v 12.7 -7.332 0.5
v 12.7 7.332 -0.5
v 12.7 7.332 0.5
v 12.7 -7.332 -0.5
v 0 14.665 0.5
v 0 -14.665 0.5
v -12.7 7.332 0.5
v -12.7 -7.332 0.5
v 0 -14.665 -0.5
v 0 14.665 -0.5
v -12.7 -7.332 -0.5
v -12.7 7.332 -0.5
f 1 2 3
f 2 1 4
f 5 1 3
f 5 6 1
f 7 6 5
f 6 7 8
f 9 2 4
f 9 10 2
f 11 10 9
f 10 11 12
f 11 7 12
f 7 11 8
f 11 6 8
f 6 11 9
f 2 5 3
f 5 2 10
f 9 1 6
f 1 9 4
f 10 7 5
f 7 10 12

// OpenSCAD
//============================================================
// OpenSCAD
// Licence : LICENCE PUBLIQUE RIEN À BRANLER
// Licence : do What The Fuck you want to Public License
//============================================================
/*

	Usage:
	use <hexagon.scad>;
	Pour créer des jeux, des têtes de vis...

*/


//------------------------------------------------------------
// Demo
//------------------------------------------------------------
$fn = 150 ;			// OpenSCAD Resolution
// hexagone de 1 pouce (1 inch) soit 25.4 mm
Hexagone(cle=25.4,h=1);

//------------------------------------------------------------
// Hexagone
// cle	écart, ex: clé de 12 alors cle=12
// h		hauteur
//------------------------------------------------------------
module Hexagone(cle,h)
{
	angle = 360/6;		// 6 pans
	cote = cle * cot(angle);
	echo(angle, cot(angle), cote);
	echo(acos(.6));

	union()
	{
		rotate([0,0,0])
			cube([cle,cote,h],center=true);
		rotate([0,0,angle])
			cube([cle,cote,h],center=true);
		rotate([0,0,2*angle])
			cube([cle,cote,h],center=true);
	}

// Vérification par un cercle de taille cle
//	#cylinder(r=cle/2,h=2*h,center=true);
//	%circle(r=cote,center=true);
//	#cube([cote,cote,1]);
}

//------------------------------------------------------------
// Fonction cotangente
// Permet d'avoir les bones dimensions
// utiliser $fn n'est pas bon
//------------------------------------------------------------
function cot(x)=1/tan(x);

//==EOF=======================================================
